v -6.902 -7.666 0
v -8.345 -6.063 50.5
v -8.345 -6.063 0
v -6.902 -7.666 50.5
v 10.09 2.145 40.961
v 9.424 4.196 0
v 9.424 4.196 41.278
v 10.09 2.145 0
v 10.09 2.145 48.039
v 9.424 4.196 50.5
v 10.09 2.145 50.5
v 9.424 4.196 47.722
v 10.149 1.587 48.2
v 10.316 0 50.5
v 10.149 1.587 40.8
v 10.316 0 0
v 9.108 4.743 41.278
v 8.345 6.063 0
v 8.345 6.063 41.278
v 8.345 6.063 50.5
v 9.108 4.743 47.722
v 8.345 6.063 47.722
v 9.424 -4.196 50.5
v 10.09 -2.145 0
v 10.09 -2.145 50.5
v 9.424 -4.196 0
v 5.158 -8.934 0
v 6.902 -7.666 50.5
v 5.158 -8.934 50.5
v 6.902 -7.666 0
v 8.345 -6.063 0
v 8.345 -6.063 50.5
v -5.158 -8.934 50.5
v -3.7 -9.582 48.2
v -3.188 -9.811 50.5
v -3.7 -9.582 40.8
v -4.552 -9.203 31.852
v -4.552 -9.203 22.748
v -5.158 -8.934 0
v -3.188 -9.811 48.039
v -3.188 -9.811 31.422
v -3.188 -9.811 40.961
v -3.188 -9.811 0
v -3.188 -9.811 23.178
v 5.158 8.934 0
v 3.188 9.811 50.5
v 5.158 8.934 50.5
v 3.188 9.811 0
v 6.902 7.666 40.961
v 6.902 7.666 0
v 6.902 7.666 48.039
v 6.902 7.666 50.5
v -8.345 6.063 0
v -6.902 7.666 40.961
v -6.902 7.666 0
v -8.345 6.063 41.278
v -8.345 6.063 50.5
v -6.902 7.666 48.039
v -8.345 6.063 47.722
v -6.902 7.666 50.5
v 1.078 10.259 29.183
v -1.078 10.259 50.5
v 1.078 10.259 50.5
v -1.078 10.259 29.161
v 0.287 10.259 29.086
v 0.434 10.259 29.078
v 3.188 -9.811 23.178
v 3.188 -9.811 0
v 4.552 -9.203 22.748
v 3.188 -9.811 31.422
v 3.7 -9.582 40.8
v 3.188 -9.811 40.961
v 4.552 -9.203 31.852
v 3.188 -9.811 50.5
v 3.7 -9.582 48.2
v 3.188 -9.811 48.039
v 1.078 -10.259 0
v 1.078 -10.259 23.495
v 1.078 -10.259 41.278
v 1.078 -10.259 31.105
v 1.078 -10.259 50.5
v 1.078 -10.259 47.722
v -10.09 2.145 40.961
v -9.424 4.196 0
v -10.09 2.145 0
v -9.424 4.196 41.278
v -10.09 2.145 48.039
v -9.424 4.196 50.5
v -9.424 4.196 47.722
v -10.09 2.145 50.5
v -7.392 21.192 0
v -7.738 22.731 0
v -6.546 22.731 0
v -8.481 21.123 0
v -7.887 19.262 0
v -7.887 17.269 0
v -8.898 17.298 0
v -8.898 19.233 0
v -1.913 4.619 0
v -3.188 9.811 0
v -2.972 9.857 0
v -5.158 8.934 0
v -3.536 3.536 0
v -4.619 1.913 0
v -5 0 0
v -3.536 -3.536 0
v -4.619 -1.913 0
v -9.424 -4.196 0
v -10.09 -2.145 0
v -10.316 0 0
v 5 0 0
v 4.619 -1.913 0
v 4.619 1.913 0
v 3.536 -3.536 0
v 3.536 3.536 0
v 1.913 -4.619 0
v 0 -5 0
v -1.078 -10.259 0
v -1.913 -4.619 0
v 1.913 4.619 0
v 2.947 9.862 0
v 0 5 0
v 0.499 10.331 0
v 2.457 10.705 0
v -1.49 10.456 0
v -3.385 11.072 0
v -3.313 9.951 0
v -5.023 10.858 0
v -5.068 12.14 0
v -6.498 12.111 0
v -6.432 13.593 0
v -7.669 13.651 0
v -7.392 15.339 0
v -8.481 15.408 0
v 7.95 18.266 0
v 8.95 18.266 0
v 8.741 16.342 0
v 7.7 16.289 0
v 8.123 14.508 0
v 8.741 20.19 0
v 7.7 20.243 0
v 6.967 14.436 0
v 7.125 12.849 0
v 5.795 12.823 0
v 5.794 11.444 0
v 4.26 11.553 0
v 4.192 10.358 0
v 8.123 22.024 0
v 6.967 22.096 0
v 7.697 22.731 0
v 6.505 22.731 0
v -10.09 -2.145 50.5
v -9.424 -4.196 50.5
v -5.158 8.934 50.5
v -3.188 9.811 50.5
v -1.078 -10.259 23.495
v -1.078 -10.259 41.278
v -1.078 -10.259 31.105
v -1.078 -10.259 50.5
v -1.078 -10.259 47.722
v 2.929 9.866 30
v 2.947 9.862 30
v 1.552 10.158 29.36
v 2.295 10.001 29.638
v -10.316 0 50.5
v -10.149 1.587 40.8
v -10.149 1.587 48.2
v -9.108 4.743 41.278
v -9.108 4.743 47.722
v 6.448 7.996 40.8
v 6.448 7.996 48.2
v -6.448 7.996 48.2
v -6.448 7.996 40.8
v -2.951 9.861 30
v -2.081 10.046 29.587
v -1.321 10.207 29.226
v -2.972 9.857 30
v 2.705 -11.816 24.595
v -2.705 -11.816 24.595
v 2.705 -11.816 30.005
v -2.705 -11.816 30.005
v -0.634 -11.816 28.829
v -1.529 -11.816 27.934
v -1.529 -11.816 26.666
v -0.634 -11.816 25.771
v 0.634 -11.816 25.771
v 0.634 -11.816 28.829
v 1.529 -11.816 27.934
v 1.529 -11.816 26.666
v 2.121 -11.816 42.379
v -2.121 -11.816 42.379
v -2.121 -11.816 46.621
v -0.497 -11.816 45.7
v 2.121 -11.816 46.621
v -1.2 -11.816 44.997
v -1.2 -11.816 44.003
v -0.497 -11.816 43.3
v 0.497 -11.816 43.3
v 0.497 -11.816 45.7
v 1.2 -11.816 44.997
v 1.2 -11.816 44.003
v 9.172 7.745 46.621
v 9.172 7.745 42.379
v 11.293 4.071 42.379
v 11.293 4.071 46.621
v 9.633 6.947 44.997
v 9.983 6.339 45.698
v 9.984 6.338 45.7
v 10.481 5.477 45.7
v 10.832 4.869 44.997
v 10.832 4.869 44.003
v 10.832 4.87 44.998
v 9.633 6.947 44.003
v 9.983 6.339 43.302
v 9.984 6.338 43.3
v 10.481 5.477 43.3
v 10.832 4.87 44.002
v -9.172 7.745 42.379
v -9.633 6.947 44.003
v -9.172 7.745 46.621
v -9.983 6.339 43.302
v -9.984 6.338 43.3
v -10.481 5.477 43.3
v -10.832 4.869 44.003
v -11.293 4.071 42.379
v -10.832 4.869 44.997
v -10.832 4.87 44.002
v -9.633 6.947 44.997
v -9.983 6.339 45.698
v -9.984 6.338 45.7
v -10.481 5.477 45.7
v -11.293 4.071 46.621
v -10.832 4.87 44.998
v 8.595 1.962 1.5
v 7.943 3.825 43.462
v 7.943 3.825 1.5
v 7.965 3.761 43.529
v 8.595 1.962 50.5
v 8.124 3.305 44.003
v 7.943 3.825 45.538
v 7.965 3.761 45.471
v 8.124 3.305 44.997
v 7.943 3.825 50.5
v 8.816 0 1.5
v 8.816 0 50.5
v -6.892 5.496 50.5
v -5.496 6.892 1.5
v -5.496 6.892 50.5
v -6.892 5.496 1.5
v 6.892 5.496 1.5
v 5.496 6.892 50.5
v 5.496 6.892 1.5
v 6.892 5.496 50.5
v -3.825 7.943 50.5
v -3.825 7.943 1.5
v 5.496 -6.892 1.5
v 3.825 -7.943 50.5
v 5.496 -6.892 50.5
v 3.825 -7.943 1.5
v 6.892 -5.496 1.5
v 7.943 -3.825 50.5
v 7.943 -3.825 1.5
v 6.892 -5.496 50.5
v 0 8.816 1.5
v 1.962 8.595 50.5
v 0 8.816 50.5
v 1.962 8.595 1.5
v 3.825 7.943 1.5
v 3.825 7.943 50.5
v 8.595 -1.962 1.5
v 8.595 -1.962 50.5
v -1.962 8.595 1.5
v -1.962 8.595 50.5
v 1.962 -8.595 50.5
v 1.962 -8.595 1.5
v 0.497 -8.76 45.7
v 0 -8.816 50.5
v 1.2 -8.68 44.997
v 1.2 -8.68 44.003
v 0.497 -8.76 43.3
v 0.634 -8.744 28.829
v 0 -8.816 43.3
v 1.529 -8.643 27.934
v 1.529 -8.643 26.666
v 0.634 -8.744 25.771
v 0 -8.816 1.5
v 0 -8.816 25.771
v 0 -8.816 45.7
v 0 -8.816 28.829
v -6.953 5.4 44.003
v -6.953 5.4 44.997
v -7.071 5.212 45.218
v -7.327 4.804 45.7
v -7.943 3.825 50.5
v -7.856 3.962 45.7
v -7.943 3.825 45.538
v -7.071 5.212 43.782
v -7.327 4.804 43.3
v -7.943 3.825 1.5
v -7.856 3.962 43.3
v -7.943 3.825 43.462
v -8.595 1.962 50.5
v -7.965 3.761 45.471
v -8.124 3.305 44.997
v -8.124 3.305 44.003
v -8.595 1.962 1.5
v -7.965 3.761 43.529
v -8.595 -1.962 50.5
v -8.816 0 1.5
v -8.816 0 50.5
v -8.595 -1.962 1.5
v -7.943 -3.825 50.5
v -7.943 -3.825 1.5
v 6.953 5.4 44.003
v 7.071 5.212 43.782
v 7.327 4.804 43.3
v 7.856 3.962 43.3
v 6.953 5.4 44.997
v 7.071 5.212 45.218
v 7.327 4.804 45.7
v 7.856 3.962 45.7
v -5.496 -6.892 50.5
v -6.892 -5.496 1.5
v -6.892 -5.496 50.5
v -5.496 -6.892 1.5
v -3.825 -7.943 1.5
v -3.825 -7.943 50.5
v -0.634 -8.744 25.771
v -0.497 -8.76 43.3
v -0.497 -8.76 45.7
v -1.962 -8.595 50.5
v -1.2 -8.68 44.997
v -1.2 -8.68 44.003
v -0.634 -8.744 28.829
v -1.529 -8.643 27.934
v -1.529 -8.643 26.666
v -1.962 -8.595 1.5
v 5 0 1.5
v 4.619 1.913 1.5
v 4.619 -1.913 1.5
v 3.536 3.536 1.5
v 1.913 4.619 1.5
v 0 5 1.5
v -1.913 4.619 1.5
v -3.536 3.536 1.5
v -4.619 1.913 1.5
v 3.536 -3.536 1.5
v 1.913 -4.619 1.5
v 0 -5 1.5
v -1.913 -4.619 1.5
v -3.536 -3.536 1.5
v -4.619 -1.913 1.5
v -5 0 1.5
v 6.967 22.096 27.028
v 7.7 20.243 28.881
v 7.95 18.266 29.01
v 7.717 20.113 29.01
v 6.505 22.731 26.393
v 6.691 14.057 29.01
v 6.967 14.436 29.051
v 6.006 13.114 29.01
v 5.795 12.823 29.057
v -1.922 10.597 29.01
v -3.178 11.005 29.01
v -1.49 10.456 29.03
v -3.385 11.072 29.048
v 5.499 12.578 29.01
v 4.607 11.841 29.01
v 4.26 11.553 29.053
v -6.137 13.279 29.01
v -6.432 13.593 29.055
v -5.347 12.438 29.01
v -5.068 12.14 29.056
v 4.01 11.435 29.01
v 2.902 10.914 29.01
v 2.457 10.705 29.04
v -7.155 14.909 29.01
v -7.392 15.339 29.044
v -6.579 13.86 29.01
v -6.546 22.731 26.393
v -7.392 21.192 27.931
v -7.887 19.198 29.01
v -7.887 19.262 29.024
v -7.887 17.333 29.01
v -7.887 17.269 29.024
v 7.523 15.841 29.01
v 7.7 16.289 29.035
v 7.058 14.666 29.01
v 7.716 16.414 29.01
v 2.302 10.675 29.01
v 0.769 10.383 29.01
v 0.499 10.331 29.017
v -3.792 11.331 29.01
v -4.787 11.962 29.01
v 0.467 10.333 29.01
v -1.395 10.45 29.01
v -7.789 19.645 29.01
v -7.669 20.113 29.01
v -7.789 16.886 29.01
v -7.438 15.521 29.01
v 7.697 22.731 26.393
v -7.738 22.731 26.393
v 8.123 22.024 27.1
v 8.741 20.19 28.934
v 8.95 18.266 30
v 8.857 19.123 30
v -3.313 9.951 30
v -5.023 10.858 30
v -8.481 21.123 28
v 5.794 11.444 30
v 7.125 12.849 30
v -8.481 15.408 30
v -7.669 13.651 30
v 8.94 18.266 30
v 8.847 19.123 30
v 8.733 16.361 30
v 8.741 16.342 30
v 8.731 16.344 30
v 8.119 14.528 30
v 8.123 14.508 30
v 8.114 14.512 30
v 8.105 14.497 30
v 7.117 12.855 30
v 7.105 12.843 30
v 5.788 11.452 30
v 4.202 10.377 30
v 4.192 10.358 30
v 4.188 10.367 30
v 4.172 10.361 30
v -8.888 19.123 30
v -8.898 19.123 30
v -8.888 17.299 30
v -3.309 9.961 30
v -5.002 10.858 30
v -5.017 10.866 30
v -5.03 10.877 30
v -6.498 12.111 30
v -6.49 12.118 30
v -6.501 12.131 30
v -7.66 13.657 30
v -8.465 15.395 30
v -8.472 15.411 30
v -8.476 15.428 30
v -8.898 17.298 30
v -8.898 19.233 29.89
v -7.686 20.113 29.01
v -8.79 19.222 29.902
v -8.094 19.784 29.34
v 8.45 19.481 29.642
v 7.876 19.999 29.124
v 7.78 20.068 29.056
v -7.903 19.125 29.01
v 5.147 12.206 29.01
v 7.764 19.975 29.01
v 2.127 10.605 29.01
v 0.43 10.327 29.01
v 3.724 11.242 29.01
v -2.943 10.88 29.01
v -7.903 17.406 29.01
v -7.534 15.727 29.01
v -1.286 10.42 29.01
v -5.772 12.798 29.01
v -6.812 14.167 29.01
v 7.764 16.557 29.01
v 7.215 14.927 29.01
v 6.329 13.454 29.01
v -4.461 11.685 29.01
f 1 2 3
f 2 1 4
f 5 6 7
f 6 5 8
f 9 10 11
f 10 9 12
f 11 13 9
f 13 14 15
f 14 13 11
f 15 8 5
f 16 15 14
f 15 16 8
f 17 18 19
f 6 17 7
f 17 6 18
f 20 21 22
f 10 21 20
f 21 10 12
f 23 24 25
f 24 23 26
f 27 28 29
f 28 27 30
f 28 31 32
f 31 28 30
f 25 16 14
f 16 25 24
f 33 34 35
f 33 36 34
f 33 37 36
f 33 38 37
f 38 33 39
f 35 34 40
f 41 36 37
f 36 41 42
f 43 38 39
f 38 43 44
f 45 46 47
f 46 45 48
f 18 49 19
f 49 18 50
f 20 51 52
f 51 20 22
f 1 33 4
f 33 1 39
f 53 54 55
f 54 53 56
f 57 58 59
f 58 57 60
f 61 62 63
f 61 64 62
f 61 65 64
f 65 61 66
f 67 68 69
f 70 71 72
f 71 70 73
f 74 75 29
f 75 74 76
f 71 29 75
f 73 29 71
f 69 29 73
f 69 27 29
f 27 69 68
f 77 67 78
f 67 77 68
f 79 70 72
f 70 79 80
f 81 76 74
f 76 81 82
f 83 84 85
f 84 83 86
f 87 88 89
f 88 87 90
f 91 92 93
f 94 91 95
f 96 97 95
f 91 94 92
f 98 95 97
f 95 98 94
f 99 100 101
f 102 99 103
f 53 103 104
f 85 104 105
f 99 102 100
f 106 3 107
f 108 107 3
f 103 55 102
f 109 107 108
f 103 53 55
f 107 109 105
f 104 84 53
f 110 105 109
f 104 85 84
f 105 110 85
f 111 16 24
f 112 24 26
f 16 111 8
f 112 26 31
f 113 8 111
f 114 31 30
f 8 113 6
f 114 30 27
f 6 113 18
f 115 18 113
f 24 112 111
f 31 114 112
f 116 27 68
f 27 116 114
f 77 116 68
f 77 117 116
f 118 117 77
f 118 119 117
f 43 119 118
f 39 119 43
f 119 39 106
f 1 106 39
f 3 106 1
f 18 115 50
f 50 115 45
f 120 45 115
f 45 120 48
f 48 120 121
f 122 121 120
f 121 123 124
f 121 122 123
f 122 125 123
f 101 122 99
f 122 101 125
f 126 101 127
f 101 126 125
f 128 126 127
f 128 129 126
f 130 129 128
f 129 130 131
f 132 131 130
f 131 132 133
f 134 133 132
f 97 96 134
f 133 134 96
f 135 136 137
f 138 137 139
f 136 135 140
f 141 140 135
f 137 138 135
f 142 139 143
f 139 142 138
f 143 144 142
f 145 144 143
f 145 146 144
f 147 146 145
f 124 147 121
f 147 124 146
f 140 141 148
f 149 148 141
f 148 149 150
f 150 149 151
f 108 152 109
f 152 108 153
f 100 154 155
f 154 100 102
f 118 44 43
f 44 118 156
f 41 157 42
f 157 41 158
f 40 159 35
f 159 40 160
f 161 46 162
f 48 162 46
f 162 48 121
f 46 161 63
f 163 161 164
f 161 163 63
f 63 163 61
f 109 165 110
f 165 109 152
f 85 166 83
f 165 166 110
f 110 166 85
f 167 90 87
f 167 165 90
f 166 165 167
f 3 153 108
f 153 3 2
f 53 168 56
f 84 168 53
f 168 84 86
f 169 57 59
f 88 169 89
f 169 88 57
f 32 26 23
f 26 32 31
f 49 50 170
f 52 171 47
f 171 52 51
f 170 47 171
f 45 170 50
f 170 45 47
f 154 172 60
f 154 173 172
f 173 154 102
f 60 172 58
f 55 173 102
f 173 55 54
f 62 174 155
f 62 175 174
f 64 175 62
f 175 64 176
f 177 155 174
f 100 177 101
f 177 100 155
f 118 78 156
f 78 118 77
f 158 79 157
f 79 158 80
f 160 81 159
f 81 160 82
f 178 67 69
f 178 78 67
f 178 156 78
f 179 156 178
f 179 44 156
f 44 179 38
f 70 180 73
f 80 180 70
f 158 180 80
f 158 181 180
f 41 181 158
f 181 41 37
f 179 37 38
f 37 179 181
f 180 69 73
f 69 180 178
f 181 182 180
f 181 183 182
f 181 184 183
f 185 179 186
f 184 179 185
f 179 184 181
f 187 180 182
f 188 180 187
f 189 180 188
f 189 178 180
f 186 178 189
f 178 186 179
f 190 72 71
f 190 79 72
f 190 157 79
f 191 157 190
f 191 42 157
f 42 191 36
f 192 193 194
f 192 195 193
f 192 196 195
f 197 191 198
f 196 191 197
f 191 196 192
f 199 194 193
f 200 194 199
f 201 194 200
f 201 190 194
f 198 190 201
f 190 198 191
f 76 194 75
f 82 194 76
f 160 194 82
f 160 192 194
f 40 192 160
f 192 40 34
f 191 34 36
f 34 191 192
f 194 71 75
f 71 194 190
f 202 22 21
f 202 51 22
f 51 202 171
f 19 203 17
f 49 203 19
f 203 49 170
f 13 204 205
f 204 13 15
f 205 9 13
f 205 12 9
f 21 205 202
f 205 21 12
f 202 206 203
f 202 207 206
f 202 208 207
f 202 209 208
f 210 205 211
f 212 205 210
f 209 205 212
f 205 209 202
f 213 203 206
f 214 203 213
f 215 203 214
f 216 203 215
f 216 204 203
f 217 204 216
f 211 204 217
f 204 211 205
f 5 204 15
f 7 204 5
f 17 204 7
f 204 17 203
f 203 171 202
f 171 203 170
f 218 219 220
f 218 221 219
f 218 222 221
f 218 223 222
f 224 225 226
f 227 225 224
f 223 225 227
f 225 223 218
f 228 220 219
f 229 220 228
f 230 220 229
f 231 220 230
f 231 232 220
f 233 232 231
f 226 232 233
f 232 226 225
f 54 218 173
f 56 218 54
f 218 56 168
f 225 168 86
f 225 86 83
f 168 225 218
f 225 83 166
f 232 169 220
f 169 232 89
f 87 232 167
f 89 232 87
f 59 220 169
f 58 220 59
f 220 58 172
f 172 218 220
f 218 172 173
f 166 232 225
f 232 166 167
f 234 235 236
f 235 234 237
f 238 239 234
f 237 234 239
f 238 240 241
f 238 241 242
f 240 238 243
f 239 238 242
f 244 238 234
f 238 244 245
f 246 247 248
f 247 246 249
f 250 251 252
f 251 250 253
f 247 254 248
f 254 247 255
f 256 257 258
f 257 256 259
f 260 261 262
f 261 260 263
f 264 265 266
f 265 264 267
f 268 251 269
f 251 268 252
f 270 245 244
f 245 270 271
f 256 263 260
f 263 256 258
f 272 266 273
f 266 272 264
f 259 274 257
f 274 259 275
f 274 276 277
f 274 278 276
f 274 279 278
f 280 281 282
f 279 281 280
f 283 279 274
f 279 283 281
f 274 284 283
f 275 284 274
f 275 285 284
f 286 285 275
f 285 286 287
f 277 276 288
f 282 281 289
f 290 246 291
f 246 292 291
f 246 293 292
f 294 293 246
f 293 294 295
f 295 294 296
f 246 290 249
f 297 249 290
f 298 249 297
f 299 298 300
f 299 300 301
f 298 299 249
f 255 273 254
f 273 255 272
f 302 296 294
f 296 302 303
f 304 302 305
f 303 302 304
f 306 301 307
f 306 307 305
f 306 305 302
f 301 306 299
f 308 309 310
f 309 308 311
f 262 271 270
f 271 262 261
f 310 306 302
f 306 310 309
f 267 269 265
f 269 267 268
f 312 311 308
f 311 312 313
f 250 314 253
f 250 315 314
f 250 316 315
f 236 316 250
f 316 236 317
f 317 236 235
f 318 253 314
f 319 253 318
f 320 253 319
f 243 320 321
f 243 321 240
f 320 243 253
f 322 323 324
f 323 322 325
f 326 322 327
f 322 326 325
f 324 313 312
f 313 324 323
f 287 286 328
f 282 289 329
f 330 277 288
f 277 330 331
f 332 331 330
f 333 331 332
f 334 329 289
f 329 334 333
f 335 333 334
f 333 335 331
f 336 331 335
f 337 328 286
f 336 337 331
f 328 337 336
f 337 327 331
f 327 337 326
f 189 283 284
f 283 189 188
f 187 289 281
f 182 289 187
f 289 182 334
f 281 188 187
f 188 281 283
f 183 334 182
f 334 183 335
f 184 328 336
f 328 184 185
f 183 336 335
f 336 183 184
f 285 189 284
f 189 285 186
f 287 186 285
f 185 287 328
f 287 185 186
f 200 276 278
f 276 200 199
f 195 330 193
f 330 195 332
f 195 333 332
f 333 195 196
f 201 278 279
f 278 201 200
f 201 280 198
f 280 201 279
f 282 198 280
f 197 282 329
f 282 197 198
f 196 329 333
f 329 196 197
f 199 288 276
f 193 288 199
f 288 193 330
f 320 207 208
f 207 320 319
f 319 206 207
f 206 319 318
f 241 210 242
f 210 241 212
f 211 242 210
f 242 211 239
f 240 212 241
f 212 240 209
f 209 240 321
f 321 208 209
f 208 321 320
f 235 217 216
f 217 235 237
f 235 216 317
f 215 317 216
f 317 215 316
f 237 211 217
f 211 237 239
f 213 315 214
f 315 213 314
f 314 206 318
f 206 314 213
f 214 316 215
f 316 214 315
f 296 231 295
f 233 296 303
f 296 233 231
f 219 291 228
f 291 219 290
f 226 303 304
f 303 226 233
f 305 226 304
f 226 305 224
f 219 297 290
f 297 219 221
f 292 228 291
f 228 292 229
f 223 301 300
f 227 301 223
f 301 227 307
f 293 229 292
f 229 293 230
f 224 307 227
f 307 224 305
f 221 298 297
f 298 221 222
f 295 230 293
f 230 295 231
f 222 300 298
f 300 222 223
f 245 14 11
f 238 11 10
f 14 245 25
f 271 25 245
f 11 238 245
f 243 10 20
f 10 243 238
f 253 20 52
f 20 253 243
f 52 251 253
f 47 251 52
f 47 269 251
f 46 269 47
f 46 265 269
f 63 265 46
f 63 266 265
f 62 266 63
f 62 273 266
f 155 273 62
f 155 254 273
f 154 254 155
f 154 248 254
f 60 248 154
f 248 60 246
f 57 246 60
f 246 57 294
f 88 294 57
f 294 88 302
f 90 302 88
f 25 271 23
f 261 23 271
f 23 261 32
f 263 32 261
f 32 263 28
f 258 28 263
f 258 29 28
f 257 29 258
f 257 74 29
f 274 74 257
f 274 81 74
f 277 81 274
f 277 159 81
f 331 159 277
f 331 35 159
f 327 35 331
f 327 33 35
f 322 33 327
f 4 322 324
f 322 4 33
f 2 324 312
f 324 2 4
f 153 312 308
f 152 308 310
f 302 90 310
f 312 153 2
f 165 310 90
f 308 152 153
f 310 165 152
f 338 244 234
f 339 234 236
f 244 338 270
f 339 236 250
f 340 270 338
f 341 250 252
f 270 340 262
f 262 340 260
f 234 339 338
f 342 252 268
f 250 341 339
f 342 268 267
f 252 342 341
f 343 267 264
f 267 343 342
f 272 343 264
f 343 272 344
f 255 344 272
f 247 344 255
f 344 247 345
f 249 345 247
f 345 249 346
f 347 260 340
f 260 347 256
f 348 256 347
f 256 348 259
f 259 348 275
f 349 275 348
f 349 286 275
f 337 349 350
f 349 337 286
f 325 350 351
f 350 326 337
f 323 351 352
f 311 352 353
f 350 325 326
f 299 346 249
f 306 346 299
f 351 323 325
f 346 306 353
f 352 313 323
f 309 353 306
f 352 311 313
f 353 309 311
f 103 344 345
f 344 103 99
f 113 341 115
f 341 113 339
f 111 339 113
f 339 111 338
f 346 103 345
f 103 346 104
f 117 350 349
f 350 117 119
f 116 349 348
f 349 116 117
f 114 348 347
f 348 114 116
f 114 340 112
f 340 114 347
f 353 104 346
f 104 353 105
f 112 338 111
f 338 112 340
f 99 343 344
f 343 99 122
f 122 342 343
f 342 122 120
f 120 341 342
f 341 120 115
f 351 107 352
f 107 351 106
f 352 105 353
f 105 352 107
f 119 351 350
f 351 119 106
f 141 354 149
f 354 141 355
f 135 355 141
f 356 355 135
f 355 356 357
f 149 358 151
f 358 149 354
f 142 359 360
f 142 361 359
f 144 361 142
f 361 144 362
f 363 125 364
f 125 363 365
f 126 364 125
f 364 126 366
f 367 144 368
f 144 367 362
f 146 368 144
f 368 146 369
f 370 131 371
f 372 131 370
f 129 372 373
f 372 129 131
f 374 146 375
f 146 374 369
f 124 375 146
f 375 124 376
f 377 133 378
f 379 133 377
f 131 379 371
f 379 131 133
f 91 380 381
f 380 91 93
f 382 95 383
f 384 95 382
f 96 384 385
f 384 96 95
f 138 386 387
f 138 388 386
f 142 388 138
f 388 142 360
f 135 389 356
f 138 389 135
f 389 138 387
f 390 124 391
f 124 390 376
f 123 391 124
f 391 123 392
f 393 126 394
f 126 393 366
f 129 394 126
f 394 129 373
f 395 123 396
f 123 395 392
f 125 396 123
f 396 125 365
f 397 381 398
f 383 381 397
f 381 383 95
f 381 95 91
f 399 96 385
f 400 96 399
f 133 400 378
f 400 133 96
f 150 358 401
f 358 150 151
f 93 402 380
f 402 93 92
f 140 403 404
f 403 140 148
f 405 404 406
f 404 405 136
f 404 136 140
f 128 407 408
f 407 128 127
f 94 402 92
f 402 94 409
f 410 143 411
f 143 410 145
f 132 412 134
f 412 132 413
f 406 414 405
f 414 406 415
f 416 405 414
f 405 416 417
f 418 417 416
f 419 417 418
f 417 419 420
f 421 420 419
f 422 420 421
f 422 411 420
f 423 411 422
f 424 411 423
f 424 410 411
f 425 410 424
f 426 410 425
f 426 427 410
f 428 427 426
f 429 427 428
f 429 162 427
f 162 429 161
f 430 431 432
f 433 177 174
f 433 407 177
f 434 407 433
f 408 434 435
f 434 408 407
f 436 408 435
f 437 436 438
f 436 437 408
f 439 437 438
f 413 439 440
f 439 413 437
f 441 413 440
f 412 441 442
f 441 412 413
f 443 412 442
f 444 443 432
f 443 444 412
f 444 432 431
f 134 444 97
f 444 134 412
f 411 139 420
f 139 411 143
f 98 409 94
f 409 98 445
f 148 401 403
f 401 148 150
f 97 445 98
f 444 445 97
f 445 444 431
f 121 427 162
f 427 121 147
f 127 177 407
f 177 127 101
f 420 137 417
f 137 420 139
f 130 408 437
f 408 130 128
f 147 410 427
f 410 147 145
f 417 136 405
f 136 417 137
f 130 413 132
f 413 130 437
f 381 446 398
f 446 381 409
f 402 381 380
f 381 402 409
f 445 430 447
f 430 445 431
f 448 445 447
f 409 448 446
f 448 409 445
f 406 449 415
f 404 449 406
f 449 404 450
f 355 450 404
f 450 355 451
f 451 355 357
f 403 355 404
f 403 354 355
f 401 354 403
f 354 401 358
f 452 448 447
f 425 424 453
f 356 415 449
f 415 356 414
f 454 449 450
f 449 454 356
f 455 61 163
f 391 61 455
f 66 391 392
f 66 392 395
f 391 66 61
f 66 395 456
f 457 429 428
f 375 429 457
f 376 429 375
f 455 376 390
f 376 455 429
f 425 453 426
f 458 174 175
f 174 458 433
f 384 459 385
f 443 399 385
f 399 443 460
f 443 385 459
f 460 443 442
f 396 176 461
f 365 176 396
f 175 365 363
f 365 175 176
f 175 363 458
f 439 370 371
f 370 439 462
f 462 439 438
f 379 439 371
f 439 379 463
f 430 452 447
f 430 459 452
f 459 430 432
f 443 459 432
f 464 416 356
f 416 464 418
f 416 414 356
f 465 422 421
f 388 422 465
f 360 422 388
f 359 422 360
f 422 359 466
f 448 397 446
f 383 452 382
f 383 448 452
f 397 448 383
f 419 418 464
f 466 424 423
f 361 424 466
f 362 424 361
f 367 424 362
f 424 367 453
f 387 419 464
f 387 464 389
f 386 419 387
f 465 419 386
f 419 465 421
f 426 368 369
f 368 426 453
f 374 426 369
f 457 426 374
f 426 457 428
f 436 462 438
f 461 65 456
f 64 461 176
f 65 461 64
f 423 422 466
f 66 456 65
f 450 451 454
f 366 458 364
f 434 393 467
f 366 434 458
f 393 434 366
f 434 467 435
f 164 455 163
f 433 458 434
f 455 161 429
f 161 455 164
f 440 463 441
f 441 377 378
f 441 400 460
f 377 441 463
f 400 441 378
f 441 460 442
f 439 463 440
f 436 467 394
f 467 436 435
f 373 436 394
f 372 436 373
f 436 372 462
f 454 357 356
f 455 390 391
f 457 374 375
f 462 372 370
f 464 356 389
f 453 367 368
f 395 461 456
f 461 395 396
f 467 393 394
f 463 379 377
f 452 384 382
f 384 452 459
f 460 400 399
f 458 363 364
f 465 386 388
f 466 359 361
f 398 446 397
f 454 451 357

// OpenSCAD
laserDiameter = 10;
wallThickness = 1.5;
lowerLipThickness = 1.5;
laserButtonStickout = 1.85; // distance button sticks out of tube
laserButtonDistanceFromBottomOfLaser = 29.3;
laserButtonScrewDiameter = 3.06; 
backStickout = 2; // how far laser will stick out of tube
clipLength = 30; 
clipWallThickness = 1;
blowgunDiameter = 15.9;

adjustmentRatio = 0.072;
adjustmentScrewDistance = 44.5;
adjustmentScrewDiameter = 2.4; 

laserButtonDistance = laserButtonDistanceFromBottomOfLaser - backStickout;
totalLength = adjustmentScrewDistance + 6;

tubeInnerRadius = laserDiameter/2 + laserButtonStickout + laserButtonDistance * adjustmentRatio;


nudge = 0.01;

module screw(height, angle, diameter, positive) {
    translate([0,0,height]) rotate([90,0,angle]) translate([0,0,tubeInnerRadius-wallThickness])
    if(positive) {
        rotate([0,0,45])
        cylinder(d2=diameter*2.5,d1=diameter*2.5+6*wallThickness,h=3*wallThickness,$fn=4);
    }
    else {
        rotate([0,0,22.5])
        translate([0,0,-nudge]) cylinder(d=diameter*1.082,h=3*wallThickness+2*nudge,$fn=8);
    }
}

module tube() {
    render(convexity=8)
    difference() {
        union() {
            cylinder(h=totalLength+nudge, r=tubeInnerRadius+wallThickness);
            screw(laserButtonDistance, 0, laserButtonScrewDiameter,true);
            screw(adjustmentScrewDistance, 0, adjustmentScrewDiameter,true);
            screw(adjustmentScrewDistance, 120, adjustmentScrewDiameter,true);
            screw(adjustmentScrewDistance, -120, adjustmentScrewDiameter,true);
        }
        translate([0,0,-nudge]) cylinder(h=totalLength+2*nudge, r=tubeInnerRadius);
            screw(laserButtonDistance, 0, laserButtonScrewDiameter,false);
            screw(adjustmentScrewDistance, 0, adjustmentScrewDiameter,false);
            screw(adjustmentScrewDistance, 120, adjustmentScrewDiameter,false);
            screw(adjustmentScrewDistance, -120, adjustmentScrewDiameter,false);
            translate([0,0,totalLength]) cylinder(h=30, r=tubeInnerRadius+wallThickness);
    } 

    render(convexity=8)
    difference() {
        cylinder(h=lowerLipThickness, r=tubeInnerRadius+nudge);
        translate([0,0,-nudge]) cylinder(h=lowerLipThickness+2*nudge, d=laserDiameter);
    }
}

module clip() {
    render(convexity=5)
    translate([0,blowgunDiameter/2+clipWallThickness,0])
    difference() {
                cylinder(h=clipLength,d=blowgunDiameter+2*clipWallThickness);
        translate([0,blowgunDiameter*.85,clipLength]) rotate([-45,0,0])
        cube(center=true,blowgunDiameter+2*clipWallThickness);
translate([0,0,clipLength-clipWallThickness+nudge]) cylinder(h=clipWallThickness,d1=blowgunDiameter,d2=blowgunDiameter+2*clipWallThickness);
        translate([0,0,-nudge]) {
            cylinder(h=clipLength+2*nudge,d=blowgunDiameter);
            translate([0,1.5*(clipWallThickness+blowgunDiameter/2),0]) linear_extrude(height=clipLength+2*nudge) square(center=true, blowgunDiameter+2*clipWallThickness+2*nudge);
        }
    }
}

tube();
translate([0,tubeInnerRadius+wallThickness-clipWallThickness,0])
clip();
